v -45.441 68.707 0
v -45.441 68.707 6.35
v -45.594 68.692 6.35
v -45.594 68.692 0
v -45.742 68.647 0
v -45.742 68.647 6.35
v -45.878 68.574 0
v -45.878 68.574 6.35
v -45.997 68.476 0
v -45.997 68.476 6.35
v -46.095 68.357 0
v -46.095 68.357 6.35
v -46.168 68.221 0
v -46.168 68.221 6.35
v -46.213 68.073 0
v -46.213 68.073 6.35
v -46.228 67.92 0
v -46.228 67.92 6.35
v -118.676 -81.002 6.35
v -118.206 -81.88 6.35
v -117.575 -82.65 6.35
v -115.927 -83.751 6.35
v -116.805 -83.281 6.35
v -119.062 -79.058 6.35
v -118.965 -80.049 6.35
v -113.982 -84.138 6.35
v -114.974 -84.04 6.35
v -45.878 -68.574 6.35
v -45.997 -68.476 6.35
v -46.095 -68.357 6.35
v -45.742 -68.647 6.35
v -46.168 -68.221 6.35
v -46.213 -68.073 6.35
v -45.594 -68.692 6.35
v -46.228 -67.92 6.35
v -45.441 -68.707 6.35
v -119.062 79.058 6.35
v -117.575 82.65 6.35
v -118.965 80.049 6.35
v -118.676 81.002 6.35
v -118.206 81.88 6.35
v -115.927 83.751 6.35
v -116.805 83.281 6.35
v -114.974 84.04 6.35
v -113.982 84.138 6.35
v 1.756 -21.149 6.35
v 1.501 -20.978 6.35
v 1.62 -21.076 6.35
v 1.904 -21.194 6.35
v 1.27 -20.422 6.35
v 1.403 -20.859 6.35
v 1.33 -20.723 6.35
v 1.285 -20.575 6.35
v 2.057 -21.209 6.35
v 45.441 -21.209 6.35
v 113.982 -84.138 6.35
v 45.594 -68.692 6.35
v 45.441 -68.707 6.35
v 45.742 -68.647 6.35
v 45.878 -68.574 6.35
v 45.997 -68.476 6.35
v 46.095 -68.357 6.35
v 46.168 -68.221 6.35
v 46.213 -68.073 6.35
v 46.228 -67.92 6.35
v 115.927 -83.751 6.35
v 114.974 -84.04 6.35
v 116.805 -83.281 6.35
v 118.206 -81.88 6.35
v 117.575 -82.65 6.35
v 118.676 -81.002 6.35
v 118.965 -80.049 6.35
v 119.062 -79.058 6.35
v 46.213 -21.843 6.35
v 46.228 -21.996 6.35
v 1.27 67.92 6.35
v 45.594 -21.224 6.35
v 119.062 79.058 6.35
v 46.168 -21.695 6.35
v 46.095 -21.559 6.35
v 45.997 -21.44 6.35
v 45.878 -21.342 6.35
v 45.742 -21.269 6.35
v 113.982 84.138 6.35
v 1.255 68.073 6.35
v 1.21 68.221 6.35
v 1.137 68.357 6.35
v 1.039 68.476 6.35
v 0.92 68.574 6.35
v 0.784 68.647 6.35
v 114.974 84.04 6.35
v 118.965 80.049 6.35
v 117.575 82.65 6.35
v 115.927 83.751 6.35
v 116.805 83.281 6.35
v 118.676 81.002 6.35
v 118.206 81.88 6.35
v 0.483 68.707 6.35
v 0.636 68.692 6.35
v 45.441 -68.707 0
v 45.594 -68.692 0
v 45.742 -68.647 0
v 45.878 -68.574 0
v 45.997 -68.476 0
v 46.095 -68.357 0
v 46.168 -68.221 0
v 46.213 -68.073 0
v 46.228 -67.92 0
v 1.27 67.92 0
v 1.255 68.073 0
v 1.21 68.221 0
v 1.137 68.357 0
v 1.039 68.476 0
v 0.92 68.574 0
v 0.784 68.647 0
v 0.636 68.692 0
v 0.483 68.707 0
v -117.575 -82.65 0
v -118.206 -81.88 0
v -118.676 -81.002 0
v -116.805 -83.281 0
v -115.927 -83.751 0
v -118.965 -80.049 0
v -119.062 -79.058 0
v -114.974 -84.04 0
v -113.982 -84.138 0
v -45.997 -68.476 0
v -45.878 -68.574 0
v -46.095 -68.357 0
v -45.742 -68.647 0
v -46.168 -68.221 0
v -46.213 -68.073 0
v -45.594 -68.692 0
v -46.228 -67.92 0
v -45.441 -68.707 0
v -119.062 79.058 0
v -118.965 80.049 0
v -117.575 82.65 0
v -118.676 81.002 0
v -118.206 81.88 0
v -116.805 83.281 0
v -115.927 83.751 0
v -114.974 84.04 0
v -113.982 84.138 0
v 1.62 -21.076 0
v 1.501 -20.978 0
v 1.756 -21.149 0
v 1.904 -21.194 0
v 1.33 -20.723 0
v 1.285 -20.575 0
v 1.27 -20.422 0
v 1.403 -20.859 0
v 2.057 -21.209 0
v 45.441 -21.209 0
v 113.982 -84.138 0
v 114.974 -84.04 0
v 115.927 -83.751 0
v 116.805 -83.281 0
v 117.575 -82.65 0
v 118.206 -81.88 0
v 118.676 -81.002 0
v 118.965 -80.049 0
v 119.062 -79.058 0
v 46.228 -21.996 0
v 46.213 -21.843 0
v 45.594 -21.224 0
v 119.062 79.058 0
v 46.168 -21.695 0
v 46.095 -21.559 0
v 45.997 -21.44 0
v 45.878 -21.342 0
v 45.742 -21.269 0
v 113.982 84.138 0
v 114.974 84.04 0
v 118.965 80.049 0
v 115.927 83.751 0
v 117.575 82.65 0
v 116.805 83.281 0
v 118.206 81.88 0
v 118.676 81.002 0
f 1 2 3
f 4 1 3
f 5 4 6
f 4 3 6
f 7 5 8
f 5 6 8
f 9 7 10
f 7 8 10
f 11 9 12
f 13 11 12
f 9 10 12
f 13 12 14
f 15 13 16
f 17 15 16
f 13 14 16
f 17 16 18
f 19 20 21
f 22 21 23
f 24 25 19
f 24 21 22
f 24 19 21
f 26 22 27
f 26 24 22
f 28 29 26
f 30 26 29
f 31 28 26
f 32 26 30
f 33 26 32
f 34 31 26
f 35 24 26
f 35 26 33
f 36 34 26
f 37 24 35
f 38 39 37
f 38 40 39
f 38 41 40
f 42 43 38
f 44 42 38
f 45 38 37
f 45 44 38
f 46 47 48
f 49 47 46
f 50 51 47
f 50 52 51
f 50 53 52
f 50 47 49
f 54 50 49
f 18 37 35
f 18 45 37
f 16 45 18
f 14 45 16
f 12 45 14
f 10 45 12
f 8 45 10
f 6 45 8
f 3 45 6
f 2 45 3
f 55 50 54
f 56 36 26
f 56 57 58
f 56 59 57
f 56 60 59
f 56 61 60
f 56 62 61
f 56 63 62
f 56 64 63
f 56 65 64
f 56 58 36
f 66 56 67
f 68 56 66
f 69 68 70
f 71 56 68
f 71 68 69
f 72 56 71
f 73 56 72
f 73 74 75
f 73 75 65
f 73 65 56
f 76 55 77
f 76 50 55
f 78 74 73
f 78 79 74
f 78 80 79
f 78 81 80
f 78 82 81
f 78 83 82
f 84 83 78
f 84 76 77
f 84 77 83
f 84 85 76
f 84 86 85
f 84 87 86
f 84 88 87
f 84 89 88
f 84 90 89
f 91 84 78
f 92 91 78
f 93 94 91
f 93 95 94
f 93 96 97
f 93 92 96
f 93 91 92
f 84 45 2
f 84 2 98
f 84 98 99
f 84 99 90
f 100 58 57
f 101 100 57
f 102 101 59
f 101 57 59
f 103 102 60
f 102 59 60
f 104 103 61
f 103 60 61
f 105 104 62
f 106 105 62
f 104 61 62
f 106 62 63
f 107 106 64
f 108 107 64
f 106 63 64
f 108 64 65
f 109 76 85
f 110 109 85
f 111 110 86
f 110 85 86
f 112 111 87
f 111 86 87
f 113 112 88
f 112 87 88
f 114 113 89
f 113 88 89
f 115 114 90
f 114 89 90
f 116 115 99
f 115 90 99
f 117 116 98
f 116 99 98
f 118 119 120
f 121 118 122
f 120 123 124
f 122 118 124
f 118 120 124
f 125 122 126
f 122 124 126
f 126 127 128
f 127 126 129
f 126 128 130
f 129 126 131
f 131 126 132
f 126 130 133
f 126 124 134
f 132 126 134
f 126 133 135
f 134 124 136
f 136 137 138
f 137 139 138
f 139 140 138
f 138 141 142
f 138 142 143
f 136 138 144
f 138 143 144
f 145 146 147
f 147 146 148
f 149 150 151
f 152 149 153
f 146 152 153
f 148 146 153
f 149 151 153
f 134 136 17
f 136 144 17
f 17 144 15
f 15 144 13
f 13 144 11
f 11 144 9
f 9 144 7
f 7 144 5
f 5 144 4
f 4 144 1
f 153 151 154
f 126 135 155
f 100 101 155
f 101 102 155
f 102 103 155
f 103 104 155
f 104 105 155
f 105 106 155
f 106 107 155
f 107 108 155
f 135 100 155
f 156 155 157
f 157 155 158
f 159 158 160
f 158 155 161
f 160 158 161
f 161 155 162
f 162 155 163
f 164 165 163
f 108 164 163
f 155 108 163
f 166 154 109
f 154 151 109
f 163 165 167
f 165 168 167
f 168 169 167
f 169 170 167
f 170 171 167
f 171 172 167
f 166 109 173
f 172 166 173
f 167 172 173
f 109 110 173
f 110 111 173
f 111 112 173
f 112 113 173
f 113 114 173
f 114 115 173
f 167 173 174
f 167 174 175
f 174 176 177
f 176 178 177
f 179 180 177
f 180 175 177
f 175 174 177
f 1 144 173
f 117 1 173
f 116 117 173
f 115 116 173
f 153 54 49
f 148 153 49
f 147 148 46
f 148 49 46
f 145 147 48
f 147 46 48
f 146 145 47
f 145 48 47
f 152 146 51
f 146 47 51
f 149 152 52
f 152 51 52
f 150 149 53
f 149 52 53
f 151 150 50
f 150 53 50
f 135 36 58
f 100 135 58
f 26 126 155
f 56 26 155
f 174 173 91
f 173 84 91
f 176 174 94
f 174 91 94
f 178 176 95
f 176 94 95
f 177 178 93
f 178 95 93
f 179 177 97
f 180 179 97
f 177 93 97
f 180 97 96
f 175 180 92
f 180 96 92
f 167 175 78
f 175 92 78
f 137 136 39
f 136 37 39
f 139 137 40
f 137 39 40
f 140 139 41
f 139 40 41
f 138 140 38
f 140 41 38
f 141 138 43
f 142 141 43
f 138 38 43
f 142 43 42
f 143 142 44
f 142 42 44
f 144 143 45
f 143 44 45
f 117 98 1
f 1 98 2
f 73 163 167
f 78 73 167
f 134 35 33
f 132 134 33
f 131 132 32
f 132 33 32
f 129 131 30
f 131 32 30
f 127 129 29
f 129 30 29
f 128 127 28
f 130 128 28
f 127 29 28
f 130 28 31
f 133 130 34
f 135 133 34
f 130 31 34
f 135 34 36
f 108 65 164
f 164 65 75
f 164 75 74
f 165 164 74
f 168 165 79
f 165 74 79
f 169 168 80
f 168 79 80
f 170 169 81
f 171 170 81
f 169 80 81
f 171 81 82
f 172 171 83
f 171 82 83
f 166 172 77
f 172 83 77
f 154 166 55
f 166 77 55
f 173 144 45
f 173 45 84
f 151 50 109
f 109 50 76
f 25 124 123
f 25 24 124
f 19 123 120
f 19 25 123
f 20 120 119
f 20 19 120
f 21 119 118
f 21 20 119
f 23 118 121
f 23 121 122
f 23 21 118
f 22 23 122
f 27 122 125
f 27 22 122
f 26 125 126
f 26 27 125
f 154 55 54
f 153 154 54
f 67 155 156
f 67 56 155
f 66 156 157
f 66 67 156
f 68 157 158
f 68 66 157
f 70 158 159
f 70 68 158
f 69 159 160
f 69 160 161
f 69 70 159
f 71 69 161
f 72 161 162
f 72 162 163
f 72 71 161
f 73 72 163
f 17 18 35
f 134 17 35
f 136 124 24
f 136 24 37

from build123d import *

# Parameters (mm, degrees)
F0_W     = 238.125
F0_H     = 168.275
F1_DEPTH = 6.35
F3_DEPTH = 25.4
F4_DEPTH = 6.351
F6_DEPTH = 6.351
F7_R     = 5.08


with BuildPart() as f1:
    # F0 (on Top) → F1 (new body)
    with BuildSketch(Plane.XY):
        Rectangle(F0_W, F0_H)
    extrude(amount=F1_DEPTH)

    # F2 (on face) → F3 (cut)
    with BuildSketch(Plane.XY.offset(6.35)):
        Polygon((0, -22.479), (0, 67.437), (-44.958, 67.437), (-44.958, -67.437), (44.958, -67.437), (44.958, -22.479), align=None)
    extrude(amount=-F3_DEPTH, mode=Mode.SUBTRACT)

    # F2 (on face) → F4 (cut, through all)
    with BuildSketch(Plane.XY.offset(6.35)):
        Polygon((0, -22.479), (0, 67.437), (-44.958, 67.437), (-44.958, -67.437), (44.958, -67.437), (44.958, -22.479), align=None)
    extrude(amount=-F4_DEPTH, mode=Mode.SUBTRACT)

    # F5 (on face) → F6 (cut, through all)
    with BuildSketch(Plane.XY.offset(6.35)):
        with BuildLine():
            Line((1.27, -20.4216), (1.27, 67.9196))
            ThreePointArc((1.27, 67.9196), (1.039376, 68.476376), (0.4826, 68.707))
            Line((0.4826, 68.707), (-45.4406, 68.707))
            ThreePointArc((-45.4406, 68.707), (-45.997376, 68.476376), (-46.228, 67.9196))
            Line((-46.228, 67.9196), (-46.228, -67.9196))
            ThreePointArc((-46.228, -67.9196), (-45.997376, -68.476376), (-45.4406, -68.707))
            Line((-45.4406, -68.707), (45.4406, -68.707))
            ThreePointArc((45.4406, -68.707), (45.997376, -68.476376), (46.228, -67.9196))
            Line((46.228, -67.9196), (46.228, -21.9964))
            ThreePointArc((46.228, -21.9964), (45.997376, -21.439624), (45.4406, -21.209))
            Line((45.4406, -21.209), (2.0574, -21.209))
            ThreePointArc((2.0574, -21.209), (1.500624, -20.978376), (1.27, -20.4216))
        make_face()
    extrude(amount=-F6_DEPTH, mode=Mode.SUBTRACT)

    # F7
    f7_edges = [f1.edges().sort_by_distance(p)[0] for p in [
        (-119.0625, -84.1375, 3.175),
        (-119.0625, 84.1375, 3.175),
        (119.0625, -84.1375, 3.175),
        (119.0625, 84.1375, 3.175),
    ]]
    fillet(f7_edges, radius=F7_R)


solid = f1.part
